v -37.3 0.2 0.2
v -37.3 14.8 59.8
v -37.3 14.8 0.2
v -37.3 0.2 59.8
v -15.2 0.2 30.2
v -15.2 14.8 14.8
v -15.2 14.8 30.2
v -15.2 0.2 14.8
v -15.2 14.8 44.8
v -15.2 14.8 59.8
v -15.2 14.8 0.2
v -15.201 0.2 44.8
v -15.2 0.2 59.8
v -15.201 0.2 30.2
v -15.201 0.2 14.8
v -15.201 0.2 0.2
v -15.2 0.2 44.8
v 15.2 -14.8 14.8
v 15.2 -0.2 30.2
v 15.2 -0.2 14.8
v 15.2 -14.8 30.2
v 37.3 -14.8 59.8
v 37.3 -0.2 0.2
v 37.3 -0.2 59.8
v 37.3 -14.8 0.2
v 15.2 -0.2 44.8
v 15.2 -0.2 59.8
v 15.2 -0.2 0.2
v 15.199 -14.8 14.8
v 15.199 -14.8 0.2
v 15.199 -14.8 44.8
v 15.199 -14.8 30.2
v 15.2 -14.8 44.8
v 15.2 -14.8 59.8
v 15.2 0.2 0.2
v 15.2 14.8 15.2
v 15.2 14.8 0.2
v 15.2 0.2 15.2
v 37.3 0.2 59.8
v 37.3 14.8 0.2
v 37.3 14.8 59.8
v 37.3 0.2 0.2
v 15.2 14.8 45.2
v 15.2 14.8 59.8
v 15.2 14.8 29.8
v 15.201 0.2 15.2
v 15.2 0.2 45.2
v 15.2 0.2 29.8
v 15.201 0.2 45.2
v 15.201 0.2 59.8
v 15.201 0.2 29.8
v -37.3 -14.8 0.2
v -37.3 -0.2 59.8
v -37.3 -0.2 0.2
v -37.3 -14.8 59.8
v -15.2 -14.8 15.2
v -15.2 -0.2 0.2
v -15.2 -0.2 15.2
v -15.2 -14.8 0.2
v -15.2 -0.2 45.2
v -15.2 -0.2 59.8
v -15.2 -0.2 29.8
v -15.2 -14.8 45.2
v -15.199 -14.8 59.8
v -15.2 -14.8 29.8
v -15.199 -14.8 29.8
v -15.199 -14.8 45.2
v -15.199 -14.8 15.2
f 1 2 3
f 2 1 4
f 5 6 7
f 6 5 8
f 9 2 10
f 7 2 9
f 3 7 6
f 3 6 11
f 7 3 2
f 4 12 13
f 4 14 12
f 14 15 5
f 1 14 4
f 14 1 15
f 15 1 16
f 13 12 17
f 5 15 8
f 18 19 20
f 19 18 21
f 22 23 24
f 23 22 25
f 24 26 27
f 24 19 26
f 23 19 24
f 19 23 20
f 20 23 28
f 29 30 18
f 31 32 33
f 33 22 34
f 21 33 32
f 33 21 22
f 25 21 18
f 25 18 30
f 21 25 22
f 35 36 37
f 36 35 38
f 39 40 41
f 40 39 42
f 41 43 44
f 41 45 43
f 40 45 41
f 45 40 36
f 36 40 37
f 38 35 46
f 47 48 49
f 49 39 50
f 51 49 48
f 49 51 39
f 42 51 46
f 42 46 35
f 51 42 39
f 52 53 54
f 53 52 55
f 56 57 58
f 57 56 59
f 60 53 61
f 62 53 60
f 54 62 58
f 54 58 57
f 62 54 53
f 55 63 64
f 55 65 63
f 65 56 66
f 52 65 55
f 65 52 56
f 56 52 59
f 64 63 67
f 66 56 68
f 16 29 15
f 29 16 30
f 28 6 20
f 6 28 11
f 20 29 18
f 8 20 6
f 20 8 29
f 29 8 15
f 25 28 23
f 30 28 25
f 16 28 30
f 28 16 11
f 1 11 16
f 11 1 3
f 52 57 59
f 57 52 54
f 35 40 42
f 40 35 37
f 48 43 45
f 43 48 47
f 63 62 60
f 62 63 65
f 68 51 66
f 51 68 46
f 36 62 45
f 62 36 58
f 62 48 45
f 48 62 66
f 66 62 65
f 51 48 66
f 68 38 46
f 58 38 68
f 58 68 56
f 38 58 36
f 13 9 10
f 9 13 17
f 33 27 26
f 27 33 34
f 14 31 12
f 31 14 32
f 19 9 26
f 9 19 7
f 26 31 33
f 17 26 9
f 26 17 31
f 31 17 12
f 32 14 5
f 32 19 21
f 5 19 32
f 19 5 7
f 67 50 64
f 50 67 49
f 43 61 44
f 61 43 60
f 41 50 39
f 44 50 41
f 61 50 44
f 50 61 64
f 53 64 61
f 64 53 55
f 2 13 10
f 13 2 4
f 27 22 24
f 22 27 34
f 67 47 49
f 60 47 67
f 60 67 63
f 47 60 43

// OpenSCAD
gap=.4;
grid=15;

module lubonify(count=4){
    intersection(){
        for(i=[0:count-1]) {
            translate([0,0,i*grid])
            if(i%2){
                children();
            } else {
                mirror([1,0,0]) children();
            }
        }
        translate([0,0,count*grid/2])
            cube([200,200,count*grid-gap],center=true);
    }
}
module icube(x=1,y=1,dx=0,dy=0,zgap=false){
    translate([dx*grid,dy*grid,0])
        translate([gap/2,gap/2,zgap ? gap/2 : 0])
        cube([x*grid-gap,y*grid-gap,grid-(zgap ? gap : 0)]);
}

module naive_spinny(){
    translate([0,0,gap/2])
        cylinder(r=grid-gap/2,h=grid-gap);
    difference(){
        union(){
            icube(4,1);
            icube(4,1,-4,-1);
        }
        translate([0,0,-.1])
        cylinder(r=grid-gap/2,h=grid+.2);
    }
    difference(){
        union(){
            icube(4,1,0,-1);
            icube(4,1,-4,0);
        }
        translate([0,0,-.1])
        cylinder(r=grid+gap/2,h=grid+.2);
    }
}

module spinny(){
    translate([0,0,gap/2])
        cylinder(r=grid-gap/2,h=grid-gap);
    icube(2,1,1,0);
    icube(2,1,-3,-1);
    icube(2,1,-3,0);
    icube(2,1,1,-1);
    icube(2,1,0,0, zgap=true);
    icube(2,1,-2,-1, zgap=true);
}

module unspinny(){
    icube(1.5,1,1,0);
    icube(1.5,1,-2.5,-1);
    icube(1.5,1,-2.5,0);
    icube(1.5,1,1,-1);
    hull(){
        translate([grid+gap/2,gap/2,gap/2])
            cube([.001,grid-gap,grid-gap]);
        translate([-grid-gap/2,-grid+gap/2,gap/2])
            cube([.001,grid-gap,grid-gap]);
    }
}
//#rotate([0,0,45]) cube([100,.001,100], center=true);
lubonify() unspinny();
